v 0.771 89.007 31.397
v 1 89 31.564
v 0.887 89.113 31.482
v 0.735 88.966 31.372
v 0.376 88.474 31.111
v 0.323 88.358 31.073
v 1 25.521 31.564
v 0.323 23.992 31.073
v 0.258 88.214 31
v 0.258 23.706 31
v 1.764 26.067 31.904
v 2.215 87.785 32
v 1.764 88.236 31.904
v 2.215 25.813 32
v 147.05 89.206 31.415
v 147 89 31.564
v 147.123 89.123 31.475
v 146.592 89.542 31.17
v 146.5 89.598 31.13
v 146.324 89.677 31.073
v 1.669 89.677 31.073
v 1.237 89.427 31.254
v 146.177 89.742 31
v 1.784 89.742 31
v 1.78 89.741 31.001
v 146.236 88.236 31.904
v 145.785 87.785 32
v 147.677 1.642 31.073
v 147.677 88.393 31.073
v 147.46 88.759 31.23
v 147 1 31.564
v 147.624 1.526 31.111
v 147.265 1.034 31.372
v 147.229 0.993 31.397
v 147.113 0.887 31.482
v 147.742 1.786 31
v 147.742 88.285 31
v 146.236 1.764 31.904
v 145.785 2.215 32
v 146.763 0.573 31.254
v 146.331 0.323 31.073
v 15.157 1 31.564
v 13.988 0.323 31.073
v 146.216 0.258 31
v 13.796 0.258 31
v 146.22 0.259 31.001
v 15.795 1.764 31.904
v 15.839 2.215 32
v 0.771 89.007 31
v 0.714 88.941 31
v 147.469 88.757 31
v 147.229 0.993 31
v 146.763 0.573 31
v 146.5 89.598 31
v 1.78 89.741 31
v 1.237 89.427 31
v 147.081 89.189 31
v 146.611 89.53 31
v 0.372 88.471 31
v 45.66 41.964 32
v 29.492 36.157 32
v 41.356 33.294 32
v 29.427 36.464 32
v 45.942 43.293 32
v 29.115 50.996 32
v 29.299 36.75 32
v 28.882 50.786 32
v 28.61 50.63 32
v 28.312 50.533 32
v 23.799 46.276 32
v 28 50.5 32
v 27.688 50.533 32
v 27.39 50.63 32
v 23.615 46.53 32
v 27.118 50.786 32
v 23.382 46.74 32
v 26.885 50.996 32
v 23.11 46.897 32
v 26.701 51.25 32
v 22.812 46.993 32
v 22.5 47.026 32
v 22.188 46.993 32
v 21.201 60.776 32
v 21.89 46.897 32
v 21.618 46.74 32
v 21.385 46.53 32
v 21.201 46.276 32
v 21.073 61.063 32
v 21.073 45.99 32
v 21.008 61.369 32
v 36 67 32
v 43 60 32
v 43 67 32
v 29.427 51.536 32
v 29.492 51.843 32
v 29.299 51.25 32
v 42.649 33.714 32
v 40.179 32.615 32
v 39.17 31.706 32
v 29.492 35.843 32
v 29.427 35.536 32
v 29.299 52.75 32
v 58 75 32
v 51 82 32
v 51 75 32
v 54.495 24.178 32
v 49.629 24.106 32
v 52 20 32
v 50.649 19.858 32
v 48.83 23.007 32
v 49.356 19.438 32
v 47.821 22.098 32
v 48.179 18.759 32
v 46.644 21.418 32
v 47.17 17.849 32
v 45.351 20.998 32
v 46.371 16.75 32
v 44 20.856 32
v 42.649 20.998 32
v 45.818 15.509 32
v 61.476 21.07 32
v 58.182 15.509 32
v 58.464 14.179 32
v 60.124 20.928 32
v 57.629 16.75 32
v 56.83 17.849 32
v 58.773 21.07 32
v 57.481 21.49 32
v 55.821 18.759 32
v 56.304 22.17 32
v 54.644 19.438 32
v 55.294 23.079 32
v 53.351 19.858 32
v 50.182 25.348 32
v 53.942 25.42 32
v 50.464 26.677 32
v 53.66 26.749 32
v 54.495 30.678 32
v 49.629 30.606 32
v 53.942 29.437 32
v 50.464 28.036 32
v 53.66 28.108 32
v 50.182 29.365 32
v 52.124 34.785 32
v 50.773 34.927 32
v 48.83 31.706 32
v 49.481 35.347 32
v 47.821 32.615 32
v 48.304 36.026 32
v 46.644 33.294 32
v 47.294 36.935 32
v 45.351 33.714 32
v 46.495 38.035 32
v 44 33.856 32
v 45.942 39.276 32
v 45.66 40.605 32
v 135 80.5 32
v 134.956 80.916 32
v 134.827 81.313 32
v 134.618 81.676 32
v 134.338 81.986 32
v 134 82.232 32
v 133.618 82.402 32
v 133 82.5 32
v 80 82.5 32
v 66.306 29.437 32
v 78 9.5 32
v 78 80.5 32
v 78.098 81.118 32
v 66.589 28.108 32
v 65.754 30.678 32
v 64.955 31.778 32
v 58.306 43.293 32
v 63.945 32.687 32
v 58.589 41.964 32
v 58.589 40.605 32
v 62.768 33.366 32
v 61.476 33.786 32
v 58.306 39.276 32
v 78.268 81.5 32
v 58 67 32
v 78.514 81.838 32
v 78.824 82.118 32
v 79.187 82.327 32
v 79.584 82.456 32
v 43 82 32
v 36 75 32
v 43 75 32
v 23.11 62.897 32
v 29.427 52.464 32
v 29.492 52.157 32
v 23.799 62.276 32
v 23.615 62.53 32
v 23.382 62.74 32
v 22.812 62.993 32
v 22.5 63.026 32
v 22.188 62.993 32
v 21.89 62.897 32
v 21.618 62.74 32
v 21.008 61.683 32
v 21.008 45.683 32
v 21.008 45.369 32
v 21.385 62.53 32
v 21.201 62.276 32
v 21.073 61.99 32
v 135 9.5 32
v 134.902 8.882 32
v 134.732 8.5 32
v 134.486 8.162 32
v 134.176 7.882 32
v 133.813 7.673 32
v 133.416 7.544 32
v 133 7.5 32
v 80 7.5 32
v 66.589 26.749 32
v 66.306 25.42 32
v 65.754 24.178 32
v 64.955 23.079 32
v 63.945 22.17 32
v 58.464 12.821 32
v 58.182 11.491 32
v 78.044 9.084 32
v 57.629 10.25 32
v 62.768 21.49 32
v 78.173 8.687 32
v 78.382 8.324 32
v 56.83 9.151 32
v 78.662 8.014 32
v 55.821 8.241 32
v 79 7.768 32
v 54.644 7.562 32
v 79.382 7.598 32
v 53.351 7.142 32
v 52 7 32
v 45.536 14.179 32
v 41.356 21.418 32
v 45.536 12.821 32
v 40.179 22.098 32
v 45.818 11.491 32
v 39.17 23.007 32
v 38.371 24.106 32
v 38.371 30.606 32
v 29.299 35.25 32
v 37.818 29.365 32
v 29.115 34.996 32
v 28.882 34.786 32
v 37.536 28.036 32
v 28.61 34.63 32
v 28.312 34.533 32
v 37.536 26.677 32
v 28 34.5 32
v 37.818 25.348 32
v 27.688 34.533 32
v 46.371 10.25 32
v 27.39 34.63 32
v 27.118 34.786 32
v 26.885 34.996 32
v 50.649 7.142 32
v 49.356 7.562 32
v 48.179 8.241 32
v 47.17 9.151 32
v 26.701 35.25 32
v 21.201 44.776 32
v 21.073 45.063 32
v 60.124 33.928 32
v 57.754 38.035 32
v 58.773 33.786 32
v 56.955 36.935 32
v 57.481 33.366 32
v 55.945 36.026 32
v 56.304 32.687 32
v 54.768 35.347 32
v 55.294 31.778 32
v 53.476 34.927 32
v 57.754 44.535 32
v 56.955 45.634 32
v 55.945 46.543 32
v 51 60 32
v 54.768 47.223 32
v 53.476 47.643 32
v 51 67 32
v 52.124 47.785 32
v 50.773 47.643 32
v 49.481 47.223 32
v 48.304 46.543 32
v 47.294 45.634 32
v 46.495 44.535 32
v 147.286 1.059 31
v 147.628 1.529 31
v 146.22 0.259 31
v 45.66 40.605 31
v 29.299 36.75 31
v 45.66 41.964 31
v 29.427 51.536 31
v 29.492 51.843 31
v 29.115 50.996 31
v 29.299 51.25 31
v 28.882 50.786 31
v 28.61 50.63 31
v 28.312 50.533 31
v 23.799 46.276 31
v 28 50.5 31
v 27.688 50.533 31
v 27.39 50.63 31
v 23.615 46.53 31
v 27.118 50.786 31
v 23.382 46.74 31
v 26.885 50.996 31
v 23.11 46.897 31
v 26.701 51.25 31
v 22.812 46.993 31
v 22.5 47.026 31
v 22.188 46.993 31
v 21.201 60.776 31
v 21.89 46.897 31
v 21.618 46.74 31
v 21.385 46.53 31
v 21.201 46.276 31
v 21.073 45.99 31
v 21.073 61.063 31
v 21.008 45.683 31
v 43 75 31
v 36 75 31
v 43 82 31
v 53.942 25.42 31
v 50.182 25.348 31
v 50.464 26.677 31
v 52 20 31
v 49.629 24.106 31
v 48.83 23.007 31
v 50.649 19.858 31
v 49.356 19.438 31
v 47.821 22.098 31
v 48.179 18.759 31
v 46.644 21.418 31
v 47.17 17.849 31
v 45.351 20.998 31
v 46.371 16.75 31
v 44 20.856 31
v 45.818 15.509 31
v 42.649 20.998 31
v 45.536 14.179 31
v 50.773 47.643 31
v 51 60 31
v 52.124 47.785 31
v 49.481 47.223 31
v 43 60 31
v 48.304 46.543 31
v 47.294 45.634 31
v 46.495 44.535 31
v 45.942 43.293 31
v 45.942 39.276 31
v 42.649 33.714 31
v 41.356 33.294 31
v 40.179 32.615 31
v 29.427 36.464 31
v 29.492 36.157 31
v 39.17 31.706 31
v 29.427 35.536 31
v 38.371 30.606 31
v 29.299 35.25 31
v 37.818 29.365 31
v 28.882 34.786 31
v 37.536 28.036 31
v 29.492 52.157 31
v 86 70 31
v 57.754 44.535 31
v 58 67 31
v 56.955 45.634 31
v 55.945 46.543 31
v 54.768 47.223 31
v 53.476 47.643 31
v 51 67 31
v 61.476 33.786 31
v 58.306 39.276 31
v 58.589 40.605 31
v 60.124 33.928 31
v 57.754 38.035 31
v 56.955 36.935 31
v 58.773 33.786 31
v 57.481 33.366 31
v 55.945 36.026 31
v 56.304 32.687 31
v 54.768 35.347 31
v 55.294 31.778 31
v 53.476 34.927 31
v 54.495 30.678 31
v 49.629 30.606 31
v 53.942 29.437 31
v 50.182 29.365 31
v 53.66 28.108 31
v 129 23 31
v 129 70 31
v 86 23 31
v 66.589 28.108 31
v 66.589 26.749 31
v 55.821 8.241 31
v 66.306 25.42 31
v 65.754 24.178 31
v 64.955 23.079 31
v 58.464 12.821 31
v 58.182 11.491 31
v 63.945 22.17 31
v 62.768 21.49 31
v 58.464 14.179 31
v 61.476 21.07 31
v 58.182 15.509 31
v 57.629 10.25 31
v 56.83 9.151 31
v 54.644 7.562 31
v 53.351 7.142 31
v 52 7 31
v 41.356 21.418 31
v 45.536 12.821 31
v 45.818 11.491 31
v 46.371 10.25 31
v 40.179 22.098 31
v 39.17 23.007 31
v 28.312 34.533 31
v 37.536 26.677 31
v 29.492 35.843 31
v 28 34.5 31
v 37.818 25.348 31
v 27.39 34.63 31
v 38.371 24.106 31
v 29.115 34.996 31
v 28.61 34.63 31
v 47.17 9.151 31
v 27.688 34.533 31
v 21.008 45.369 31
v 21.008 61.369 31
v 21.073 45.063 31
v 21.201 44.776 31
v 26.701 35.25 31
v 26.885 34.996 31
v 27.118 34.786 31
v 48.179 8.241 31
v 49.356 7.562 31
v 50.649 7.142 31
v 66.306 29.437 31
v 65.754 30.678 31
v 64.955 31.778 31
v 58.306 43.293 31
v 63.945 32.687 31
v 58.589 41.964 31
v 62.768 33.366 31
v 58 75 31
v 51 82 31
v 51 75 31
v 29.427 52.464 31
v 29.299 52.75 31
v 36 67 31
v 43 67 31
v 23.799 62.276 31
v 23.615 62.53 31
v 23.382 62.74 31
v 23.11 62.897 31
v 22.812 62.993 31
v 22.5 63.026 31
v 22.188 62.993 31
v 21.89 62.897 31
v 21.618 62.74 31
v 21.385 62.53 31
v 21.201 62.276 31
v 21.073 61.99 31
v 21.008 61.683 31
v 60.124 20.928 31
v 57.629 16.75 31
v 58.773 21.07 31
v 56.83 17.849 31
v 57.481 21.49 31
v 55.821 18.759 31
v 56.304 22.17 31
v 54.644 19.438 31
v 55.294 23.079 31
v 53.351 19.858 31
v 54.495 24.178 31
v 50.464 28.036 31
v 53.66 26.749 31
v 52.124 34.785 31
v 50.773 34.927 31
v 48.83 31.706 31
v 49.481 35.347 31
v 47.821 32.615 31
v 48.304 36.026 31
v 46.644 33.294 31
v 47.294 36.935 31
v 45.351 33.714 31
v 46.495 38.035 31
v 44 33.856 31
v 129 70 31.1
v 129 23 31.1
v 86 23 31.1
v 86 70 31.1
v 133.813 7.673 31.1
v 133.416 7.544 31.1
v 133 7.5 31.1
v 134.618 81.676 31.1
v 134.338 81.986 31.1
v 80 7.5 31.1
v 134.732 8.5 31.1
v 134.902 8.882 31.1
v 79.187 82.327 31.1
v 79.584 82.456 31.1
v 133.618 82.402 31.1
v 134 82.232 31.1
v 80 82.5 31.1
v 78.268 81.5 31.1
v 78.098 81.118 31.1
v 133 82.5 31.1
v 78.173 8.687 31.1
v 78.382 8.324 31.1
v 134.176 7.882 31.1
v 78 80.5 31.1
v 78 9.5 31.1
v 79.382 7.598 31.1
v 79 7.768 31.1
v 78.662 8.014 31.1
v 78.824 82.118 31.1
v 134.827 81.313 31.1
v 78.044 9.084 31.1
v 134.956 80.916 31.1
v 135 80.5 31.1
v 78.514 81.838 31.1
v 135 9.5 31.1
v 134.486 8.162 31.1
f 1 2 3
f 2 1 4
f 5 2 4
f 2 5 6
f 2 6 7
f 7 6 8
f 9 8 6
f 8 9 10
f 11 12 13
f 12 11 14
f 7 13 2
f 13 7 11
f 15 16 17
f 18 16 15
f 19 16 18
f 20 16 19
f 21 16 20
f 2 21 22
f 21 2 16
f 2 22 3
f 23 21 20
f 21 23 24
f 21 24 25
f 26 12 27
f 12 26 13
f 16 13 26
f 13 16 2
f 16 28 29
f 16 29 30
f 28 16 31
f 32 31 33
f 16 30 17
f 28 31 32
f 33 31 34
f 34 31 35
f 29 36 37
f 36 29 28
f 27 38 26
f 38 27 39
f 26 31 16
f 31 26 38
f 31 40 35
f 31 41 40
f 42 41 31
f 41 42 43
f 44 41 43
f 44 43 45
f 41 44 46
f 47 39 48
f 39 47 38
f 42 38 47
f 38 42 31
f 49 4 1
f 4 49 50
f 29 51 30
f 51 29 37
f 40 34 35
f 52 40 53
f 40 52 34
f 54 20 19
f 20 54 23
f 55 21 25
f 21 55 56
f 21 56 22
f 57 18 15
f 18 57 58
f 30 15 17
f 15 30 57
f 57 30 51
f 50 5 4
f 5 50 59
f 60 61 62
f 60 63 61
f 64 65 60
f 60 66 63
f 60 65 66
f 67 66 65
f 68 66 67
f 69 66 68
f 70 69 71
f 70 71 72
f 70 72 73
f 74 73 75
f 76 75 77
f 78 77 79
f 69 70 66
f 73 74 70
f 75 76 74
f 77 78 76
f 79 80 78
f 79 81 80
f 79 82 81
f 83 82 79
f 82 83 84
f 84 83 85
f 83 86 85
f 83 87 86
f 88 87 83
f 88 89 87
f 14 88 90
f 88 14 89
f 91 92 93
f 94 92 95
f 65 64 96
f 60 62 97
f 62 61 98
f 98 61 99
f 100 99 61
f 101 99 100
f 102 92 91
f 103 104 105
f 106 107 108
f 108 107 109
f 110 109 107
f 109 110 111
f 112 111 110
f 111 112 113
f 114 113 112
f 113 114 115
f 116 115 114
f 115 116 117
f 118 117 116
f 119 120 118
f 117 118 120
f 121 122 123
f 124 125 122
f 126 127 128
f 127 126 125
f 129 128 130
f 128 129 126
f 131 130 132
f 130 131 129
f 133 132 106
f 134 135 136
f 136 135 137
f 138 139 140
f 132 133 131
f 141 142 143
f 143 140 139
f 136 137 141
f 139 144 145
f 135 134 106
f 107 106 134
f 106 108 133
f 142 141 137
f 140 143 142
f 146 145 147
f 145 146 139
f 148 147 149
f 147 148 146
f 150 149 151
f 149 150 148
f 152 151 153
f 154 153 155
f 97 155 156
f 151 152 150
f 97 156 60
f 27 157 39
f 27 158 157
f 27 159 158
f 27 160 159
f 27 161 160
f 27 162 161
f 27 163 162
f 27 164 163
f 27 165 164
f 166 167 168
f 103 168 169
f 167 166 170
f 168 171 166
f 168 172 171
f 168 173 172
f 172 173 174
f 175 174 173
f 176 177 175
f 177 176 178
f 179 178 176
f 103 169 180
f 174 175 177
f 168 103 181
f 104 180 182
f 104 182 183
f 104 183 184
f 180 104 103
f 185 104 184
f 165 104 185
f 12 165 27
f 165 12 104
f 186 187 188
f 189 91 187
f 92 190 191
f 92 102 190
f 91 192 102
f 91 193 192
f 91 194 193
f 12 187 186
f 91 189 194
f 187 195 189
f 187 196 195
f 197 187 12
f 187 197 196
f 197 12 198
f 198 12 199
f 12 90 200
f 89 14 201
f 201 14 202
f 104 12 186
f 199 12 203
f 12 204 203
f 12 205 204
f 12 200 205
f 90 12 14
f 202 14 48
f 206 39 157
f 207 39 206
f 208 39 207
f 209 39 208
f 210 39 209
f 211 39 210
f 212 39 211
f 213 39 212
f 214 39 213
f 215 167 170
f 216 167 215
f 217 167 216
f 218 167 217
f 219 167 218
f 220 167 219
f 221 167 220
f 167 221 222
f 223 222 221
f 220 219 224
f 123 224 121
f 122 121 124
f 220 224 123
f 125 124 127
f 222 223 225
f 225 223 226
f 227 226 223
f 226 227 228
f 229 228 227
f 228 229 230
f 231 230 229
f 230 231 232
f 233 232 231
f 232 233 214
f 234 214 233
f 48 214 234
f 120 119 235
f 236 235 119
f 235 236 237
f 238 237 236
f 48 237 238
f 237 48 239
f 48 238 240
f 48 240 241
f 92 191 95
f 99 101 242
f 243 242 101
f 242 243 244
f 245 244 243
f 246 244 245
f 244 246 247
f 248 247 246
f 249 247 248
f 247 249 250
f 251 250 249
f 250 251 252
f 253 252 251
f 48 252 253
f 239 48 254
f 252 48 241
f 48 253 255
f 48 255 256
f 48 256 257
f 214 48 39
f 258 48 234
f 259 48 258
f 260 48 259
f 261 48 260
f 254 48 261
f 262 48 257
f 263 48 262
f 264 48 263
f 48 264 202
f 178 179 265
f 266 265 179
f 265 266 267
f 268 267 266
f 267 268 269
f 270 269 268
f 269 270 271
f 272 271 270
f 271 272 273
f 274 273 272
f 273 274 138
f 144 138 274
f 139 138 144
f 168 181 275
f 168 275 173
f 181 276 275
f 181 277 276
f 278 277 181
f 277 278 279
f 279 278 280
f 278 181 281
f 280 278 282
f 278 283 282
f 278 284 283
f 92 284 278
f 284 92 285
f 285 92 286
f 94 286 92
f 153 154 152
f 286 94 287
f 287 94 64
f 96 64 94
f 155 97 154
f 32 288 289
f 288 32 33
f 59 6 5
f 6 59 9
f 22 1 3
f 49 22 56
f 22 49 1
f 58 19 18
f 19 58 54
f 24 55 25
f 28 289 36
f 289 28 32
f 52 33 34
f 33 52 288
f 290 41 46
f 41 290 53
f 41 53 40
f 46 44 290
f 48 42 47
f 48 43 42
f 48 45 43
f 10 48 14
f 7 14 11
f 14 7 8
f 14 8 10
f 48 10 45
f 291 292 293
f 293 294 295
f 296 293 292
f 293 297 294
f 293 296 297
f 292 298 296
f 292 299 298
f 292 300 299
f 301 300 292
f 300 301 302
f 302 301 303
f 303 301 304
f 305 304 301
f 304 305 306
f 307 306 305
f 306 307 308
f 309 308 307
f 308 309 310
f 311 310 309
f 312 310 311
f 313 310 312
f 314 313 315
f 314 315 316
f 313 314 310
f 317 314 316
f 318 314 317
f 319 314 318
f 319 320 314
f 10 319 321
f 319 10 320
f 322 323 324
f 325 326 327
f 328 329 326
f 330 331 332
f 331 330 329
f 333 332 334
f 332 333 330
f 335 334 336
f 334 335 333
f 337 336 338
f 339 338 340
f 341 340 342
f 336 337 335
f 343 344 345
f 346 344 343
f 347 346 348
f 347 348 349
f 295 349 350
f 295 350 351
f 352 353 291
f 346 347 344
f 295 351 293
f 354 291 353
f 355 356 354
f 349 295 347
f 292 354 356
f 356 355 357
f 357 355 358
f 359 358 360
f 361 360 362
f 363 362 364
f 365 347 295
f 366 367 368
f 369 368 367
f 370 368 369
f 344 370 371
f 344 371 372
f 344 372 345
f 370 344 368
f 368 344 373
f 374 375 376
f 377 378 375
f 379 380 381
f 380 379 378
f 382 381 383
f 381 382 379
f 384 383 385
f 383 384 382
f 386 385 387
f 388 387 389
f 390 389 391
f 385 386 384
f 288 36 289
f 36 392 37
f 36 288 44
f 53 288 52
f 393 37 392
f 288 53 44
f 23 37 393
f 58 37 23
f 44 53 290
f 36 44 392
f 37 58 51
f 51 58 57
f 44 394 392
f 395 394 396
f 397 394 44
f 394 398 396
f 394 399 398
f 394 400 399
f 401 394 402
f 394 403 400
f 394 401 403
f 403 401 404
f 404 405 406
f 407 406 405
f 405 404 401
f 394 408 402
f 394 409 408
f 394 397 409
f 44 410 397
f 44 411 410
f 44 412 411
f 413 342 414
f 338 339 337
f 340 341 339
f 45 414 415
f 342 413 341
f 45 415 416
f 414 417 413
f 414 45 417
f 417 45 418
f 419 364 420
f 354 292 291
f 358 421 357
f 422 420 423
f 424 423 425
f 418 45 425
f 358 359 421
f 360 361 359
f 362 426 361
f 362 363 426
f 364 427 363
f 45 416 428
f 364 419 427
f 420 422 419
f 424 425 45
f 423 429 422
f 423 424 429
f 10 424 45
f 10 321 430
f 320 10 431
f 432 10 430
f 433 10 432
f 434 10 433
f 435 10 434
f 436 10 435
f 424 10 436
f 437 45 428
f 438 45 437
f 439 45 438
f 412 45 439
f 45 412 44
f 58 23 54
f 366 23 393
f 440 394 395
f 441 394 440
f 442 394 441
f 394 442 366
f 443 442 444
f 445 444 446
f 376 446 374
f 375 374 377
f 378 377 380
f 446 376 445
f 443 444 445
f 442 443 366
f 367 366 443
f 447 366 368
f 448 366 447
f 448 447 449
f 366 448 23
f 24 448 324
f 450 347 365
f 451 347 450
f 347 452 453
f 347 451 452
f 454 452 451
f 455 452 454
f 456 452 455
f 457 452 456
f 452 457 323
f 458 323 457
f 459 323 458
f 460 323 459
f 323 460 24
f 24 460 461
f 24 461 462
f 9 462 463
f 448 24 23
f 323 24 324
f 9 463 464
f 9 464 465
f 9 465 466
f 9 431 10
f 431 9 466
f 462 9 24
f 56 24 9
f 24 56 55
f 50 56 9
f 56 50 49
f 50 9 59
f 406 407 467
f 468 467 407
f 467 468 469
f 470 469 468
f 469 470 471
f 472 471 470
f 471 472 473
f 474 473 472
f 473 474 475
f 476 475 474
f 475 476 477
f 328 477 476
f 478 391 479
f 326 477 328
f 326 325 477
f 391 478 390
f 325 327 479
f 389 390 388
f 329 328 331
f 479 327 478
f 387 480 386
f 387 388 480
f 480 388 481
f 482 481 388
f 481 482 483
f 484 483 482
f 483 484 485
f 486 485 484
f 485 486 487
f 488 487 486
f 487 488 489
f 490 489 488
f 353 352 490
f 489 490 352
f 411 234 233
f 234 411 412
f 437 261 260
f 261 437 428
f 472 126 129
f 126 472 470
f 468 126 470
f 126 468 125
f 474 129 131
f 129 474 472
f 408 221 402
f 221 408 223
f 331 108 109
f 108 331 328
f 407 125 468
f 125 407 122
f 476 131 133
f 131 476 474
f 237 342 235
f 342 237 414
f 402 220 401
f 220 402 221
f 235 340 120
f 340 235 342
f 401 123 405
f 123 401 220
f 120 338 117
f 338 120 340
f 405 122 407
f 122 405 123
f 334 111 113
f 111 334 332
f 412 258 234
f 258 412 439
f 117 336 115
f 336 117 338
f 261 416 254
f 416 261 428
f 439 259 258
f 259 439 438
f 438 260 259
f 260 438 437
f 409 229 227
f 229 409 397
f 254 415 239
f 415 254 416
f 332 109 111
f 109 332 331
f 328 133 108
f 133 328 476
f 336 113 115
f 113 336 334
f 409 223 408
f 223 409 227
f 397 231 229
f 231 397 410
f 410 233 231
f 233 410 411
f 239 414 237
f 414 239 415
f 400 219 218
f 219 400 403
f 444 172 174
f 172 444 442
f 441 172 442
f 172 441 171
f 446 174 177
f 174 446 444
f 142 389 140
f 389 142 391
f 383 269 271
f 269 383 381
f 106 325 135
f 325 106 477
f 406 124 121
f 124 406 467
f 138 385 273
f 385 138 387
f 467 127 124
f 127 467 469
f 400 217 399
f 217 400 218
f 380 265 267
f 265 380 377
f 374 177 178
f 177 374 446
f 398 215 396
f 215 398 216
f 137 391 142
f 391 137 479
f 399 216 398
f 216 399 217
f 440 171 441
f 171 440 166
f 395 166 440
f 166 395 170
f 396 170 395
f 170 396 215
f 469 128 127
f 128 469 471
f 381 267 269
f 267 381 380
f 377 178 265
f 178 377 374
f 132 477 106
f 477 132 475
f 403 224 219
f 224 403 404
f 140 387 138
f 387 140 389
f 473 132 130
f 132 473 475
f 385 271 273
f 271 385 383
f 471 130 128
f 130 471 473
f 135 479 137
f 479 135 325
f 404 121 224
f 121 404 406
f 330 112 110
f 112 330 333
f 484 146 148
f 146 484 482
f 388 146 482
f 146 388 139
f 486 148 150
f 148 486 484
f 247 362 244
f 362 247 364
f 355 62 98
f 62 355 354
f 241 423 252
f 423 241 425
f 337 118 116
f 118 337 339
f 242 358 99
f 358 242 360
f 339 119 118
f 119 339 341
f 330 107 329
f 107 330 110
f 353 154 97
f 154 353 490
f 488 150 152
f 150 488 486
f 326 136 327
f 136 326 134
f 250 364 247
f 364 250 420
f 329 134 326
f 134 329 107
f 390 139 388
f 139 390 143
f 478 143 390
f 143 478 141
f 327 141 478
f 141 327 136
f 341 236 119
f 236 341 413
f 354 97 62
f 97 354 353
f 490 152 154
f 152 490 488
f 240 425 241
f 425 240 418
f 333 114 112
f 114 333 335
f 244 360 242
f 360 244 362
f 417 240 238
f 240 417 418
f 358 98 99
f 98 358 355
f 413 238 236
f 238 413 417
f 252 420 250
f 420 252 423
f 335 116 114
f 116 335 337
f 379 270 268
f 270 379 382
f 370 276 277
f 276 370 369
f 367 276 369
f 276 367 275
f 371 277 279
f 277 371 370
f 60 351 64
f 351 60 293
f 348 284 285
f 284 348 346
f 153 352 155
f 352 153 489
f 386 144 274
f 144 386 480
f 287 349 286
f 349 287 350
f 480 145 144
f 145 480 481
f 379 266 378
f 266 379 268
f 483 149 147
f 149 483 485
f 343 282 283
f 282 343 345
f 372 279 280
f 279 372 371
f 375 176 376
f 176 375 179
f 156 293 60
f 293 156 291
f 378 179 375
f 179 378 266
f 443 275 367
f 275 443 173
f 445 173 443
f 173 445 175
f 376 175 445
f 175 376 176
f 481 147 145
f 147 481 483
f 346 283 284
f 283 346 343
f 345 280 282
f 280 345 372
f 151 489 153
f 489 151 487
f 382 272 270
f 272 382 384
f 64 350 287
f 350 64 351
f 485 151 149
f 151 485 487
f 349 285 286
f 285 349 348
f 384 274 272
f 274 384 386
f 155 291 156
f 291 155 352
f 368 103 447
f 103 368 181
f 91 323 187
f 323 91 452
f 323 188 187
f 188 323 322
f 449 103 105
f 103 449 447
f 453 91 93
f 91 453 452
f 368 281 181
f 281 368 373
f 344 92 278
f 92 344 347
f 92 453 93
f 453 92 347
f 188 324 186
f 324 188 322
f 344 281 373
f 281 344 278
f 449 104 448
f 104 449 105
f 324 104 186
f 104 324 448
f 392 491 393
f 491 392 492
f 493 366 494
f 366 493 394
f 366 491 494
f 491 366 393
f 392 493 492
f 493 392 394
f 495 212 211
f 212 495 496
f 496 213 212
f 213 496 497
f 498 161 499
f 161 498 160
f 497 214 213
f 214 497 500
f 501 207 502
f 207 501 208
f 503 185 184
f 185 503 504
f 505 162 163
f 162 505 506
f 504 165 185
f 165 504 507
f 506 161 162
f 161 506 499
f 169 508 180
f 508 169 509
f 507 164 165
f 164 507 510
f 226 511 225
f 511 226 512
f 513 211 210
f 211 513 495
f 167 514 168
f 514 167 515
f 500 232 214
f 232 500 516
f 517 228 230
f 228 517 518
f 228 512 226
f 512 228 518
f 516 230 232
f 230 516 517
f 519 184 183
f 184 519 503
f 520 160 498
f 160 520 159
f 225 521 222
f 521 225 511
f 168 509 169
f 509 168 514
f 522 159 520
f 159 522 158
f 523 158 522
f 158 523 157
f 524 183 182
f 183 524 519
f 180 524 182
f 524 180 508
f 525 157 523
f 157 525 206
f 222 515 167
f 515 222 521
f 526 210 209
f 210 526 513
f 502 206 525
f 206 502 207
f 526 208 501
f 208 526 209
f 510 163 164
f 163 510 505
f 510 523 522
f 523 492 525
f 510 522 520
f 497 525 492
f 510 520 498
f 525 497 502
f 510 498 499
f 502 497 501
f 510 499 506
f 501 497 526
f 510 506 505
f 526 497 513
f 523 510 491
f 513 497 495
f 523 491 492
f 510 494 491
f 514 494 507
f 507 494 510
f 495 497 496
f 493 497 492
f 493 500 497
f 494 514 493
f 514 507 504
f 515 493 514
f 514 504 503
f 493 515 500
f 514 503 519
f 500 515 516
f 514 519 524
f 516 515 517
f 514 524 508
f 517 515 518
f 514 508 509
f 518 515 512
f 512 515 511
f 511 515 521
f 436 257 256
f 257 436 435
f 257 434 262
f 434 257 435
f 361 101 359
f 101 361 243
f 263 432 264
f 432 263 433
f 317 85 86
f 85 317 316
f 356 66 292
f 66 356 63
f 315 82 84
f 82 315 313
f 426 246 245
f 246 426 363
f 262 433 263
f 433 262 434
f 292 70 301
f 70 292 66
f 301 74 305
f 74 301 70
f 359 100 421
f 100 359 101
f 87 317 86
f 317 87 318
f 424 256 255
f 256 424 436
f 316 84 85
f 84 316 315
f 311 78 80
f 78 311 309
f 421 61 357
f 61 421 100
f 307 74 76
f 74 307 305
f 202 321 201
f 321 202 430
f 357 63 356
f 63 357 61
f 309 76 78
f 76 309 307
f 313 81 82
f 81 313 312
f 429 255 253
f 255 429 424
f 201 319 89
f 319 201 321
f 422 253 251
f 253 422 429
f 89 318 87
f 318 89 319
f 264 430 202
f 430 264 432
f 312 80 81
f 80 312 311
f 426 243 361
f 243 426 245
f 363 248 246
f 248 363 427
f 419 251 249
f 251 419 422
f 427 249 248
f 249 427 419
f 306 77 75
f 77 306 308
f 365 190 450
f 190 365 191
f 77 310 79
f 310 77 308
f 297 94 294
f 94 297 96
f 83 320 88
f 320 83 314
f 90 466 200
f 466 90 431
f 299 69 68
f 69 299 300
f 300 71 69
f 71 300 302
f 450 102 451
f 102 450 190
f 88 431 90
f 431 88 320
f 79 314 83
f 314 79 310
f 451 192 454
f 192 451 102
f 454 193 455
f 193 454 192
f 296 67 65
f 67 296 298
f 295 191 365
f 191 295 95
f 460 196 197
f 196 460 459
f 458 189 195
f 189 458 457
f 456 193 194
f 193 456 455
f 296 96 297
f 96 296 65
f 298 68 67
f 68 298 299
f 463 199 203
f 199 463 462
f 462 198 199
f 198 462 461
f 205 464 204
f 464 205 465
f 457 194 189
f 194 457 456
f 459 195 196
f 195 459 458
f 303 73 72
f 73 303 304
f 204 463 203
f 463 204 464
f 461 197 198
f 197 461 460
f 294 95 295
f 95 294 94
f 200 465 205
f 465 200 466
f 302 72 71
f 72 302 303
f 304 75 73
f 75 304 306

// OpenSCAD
$fn = 30;

gb_size = [148, 90, 30];
top_size = 1;

backplate_size = [113, 66, 2];
backplate_offset = [6, (gb_size[1]-backplate_size[1])/2, 0];

display_size = [43, 47, 3.1];
display_offset = [19, 20];
display_cover_size = [57, 75, 1];

speaker_radius = 16;
speaker_corner_angle = 20; 
speaker_corner_offset = [20, 35, 0];
cartridge_size = [57, 57, 7.6];

button_radius = 6.5;
button_distance= 3;
button_offset = [52, 7+button_radius, gb_size[2] + backplate_size[2]-3];

dpad_bar_size = [22, 8, 3];
dpad_offset = [36, gb_size[1]-23, gb_size[2]];

show_top = 1; 
show_bottom = 0;

module outline(w=3) {
    difference() {
        offset(w) offset(-w) children();
    }
}

function list_add(list, value) = [for (a = [ 0 : len(list) - 1 ]) list[a]+value ];

module cartridge(a=0) {
  color([.5, .5, .5, .7])
    cube(list_add(cartridge_size, a));
}

module long_button() {
  rotate([0, 0, 30]) {
    linear_extrude(height=4) {
      hull() {
        circle(r=1.5);
        translate([0, 11])
          circle(r=1.5);
      }
    }
  }  
}

module fillet(r=3, h=50) {
  difference() {
    cube([r, h, r]);
    translate([0, h+1, r]) rotate([90, 0, 0]) 
    cylinder(h=h+2, r=r);
  }
}

module half_sphere(r=10) {
  difference () {
    sphere(r=r);
    translate([-r, -r, 0]) {
      cube([r*2, r*2, r]);
    }
  }
}

module cylinder_fillet(r=10, h=5) {
  translate([0, 0, 5]) {
    difference() {
      half_sphere(r=r);
      half_sphere(r=r-2);
    }
  }
}

module gb_body() {
  difference() {
    hull() {
      // speaker round corner
      intersection() {
        translate([0, gb_size[2]/2, gb_size[2]/2+backplate_size[2]])
        rotate([0, 90, 0])
          cylinder(r=gb_size[2]/2, h=speaker_radius);
        
        translate([speaker_radius, speaker_radius, backplate_size[2]])
          cylinder(r=speaker_radius, h=gb_size[2]);
      }
      
      // bottom round edge
      translate([speaker_radius, gb_size[2]/2, gb_size[2]/2+backplate_size[2]]) {
          difference() {
            rotate([0, 90, 0]) {
              cylinder(r=gb_size[2]/2, h=gb_size[0]-speaker_radius);
            }
            // top cylinder fillet
            translate([gb_size[0]-20, 0, 0]) {
              rotate([0, 270, 0])
              cylinder_fillet(r=gb_size[2]/2+3);
            }
          }
        }

      translate([0, gb_size[1]-gb_size[2]/2, gb_size[2]/2+backplate_size[2]]) {
        difference() {
          rotate([0, 90, 0]) {
            cylinder(r=gb_size[2]/2, h=gb_size[0]);
          }
          translate([gb_size[0]-3, 0, 0]) {
            rotate([0, 270, 0])
            cylinder_fillet(r=gb_size[2]/2+3);
          }
          // bottom cylinder fillet
          translate([4, 0, 0]) {
            rotate([0, 90, 0])
            cylinder_fillet(r=gb_size[2]/2+3);
          }
        }
      }

      // main cube
      translate([0, 0, gb_size[2]/2]) {
        translate([0, 0, backplate_size[2]])
        difference() {
            
          linear_extrude(height=gb_size[2]/2) {
            hull() {
              translate([speaker_radius, 0, 0])
                outline() square([gb_size[0]-speaker_radius, gb_size[1]]);
              
              translate([0, speaker_radius, 0])
                outline() square([gb_size[0], gb_size[1]-speaker_radius]);
              
              translate([speaker_radius, speaker_radius, 0])
                circle(r=speaker_radius);
            }
          }
          
        }
      }
    }

    translate([
    gb_size[0]-cartridge_size[0]+1,
    (gb_size[1]-cartridge_size[1])/2-1,
    backplate_size[2]-1]) {
      cartridge(a=2);
    }
    
    rotate([speaker_corner_angle, 0, -60]) {
      translate([-25, -25, 25])
        cube([50, 50, 5]);
    }
    
    // front fillets
    // bottom
    translate([3, 0, gb_size[2]+backplate_size[2]+.1]) rotate([0, 180, 0]) fillet(r=4, h=gb_size[0]);
    
    // left
    translate([0, gb_size[1]-3, gb_size[2]+backplate_size[2]+.1]) rotate([0, 180, 270]) fillet(r=4, h=gb_size[0]);
    
    // top
    translate([gb_size[0]-3, 100, gb_size[2]+backplate_size[2]+.1]) rotate([180, 0, 0]) fillet(r=4, h=gb_size[0]);
    
    // right
    translate([150, 3, gb_size[2]+backplate_size[2]+.1]) rotate([0, 180, 90]) fillet(r=4, h=gb_size[0]);
  }
}

//color([1, 1, 1, 0.6])
difference() {
  
  // create an empty body
  gb_body();
  translate([3, 3, 3+backplate_size[2]])
  scale([0.96, 0.95, 0.8125]) {
    gb_body();
  }
  
  if (!show_top) {
    translate([-1, -1, gb_size[2]+backplate_size[2]-top_size])
    cube([gb_size[0]+2, gb_size[1]+2, top_size+1]);
  }
  
  if (!show_bottom) {
    translate([-1, -1, -1])
    cube([gb_size[0]+2, gb_size[1]+2, gb_size[2]+backplate_size[2]-top_size+1]);
  }
  // display 
  translate([
  gb_size[0] - display_offset[0] - display_size[0],
  gb_size[1] - display_offset[1] - display_size[1],
  .2 +gb_size[2] + backplate_size[2] - display_size[2] - display_cover_size[2]]) {
    cube(display_size);
  }
  
  // display cover
  translate([
  gb_size[0] - display_cover_size[0] - 13,
  (gb_size[1] - display_cover_size[1]) / 2,
  gb_size[2] + backplate_size[2] - display_cover_size[2] + .1
  ]) {
    linear_extrude(height=display_cover_size[2]) {
      offset(2) offset(-2)
      square([display_cover_size[0], display_cover_size[1]]);
    }
  }
  
  // A / B / X / Y buttons
  translate(button_offset)
  rotate([0, 0, 30]) {
    // A
    translate([0, 0, 0]) cylinder(r=button_radius, h=4);
    // X
    translate([button_distance+button_radius*2 - 2, 8, 0]) cylinder(r=button_radius, h=4);
    // B
    translate([0, button_distance+button_radius*2, 0]) cylinder(r=button_radius, h=4);
    // Y
    translate([button_distance+button_radius*2 - 2, 8+button_distance+button_radius*2, 0]) cylinder(r=button_radius, h=4);
  }
  
  // d-pad
  translate(dpad_offset) {
    cube(dpad_bar_size);
    
    rotate([0, 0, 90])
    translate([-7, -15, 0])
      cube(dpad_bar_size); 
  }
  
  // start
  translate([28, 36, gb_size[2] + backplate_size[2] - 3])
    long_button();
  
  // select
  translate([28, 52, gb_size[2] + backplate_size[2] - 3])
    long_button();
}
  
// backplate
if (show_bottom) {
color([0, 1, 1, 0.5])
translate(backplate_offset)
  cube(backplate_size);
}

// cartridge
if (show_bottom) {
translate([
gb_size[0]-cartridge_size[0]+.1,
(gb_size[1]-cartridge_size[1])/2,
backplate_size[2]])
  cartridge();
}








new_display_size = [64, 76.5, 3];
new_display_video = [48, 65];
new_display_offset = 12;

% color([0.2, 0.2, 0.2, 0.3])
  translate([gb_size[0]-new_display_offset-new_display_size[0], (gb_size[1]-new_display_size[1])/2, gb_size[2]-new_display_size[2]])
  cube(new_display_size);
